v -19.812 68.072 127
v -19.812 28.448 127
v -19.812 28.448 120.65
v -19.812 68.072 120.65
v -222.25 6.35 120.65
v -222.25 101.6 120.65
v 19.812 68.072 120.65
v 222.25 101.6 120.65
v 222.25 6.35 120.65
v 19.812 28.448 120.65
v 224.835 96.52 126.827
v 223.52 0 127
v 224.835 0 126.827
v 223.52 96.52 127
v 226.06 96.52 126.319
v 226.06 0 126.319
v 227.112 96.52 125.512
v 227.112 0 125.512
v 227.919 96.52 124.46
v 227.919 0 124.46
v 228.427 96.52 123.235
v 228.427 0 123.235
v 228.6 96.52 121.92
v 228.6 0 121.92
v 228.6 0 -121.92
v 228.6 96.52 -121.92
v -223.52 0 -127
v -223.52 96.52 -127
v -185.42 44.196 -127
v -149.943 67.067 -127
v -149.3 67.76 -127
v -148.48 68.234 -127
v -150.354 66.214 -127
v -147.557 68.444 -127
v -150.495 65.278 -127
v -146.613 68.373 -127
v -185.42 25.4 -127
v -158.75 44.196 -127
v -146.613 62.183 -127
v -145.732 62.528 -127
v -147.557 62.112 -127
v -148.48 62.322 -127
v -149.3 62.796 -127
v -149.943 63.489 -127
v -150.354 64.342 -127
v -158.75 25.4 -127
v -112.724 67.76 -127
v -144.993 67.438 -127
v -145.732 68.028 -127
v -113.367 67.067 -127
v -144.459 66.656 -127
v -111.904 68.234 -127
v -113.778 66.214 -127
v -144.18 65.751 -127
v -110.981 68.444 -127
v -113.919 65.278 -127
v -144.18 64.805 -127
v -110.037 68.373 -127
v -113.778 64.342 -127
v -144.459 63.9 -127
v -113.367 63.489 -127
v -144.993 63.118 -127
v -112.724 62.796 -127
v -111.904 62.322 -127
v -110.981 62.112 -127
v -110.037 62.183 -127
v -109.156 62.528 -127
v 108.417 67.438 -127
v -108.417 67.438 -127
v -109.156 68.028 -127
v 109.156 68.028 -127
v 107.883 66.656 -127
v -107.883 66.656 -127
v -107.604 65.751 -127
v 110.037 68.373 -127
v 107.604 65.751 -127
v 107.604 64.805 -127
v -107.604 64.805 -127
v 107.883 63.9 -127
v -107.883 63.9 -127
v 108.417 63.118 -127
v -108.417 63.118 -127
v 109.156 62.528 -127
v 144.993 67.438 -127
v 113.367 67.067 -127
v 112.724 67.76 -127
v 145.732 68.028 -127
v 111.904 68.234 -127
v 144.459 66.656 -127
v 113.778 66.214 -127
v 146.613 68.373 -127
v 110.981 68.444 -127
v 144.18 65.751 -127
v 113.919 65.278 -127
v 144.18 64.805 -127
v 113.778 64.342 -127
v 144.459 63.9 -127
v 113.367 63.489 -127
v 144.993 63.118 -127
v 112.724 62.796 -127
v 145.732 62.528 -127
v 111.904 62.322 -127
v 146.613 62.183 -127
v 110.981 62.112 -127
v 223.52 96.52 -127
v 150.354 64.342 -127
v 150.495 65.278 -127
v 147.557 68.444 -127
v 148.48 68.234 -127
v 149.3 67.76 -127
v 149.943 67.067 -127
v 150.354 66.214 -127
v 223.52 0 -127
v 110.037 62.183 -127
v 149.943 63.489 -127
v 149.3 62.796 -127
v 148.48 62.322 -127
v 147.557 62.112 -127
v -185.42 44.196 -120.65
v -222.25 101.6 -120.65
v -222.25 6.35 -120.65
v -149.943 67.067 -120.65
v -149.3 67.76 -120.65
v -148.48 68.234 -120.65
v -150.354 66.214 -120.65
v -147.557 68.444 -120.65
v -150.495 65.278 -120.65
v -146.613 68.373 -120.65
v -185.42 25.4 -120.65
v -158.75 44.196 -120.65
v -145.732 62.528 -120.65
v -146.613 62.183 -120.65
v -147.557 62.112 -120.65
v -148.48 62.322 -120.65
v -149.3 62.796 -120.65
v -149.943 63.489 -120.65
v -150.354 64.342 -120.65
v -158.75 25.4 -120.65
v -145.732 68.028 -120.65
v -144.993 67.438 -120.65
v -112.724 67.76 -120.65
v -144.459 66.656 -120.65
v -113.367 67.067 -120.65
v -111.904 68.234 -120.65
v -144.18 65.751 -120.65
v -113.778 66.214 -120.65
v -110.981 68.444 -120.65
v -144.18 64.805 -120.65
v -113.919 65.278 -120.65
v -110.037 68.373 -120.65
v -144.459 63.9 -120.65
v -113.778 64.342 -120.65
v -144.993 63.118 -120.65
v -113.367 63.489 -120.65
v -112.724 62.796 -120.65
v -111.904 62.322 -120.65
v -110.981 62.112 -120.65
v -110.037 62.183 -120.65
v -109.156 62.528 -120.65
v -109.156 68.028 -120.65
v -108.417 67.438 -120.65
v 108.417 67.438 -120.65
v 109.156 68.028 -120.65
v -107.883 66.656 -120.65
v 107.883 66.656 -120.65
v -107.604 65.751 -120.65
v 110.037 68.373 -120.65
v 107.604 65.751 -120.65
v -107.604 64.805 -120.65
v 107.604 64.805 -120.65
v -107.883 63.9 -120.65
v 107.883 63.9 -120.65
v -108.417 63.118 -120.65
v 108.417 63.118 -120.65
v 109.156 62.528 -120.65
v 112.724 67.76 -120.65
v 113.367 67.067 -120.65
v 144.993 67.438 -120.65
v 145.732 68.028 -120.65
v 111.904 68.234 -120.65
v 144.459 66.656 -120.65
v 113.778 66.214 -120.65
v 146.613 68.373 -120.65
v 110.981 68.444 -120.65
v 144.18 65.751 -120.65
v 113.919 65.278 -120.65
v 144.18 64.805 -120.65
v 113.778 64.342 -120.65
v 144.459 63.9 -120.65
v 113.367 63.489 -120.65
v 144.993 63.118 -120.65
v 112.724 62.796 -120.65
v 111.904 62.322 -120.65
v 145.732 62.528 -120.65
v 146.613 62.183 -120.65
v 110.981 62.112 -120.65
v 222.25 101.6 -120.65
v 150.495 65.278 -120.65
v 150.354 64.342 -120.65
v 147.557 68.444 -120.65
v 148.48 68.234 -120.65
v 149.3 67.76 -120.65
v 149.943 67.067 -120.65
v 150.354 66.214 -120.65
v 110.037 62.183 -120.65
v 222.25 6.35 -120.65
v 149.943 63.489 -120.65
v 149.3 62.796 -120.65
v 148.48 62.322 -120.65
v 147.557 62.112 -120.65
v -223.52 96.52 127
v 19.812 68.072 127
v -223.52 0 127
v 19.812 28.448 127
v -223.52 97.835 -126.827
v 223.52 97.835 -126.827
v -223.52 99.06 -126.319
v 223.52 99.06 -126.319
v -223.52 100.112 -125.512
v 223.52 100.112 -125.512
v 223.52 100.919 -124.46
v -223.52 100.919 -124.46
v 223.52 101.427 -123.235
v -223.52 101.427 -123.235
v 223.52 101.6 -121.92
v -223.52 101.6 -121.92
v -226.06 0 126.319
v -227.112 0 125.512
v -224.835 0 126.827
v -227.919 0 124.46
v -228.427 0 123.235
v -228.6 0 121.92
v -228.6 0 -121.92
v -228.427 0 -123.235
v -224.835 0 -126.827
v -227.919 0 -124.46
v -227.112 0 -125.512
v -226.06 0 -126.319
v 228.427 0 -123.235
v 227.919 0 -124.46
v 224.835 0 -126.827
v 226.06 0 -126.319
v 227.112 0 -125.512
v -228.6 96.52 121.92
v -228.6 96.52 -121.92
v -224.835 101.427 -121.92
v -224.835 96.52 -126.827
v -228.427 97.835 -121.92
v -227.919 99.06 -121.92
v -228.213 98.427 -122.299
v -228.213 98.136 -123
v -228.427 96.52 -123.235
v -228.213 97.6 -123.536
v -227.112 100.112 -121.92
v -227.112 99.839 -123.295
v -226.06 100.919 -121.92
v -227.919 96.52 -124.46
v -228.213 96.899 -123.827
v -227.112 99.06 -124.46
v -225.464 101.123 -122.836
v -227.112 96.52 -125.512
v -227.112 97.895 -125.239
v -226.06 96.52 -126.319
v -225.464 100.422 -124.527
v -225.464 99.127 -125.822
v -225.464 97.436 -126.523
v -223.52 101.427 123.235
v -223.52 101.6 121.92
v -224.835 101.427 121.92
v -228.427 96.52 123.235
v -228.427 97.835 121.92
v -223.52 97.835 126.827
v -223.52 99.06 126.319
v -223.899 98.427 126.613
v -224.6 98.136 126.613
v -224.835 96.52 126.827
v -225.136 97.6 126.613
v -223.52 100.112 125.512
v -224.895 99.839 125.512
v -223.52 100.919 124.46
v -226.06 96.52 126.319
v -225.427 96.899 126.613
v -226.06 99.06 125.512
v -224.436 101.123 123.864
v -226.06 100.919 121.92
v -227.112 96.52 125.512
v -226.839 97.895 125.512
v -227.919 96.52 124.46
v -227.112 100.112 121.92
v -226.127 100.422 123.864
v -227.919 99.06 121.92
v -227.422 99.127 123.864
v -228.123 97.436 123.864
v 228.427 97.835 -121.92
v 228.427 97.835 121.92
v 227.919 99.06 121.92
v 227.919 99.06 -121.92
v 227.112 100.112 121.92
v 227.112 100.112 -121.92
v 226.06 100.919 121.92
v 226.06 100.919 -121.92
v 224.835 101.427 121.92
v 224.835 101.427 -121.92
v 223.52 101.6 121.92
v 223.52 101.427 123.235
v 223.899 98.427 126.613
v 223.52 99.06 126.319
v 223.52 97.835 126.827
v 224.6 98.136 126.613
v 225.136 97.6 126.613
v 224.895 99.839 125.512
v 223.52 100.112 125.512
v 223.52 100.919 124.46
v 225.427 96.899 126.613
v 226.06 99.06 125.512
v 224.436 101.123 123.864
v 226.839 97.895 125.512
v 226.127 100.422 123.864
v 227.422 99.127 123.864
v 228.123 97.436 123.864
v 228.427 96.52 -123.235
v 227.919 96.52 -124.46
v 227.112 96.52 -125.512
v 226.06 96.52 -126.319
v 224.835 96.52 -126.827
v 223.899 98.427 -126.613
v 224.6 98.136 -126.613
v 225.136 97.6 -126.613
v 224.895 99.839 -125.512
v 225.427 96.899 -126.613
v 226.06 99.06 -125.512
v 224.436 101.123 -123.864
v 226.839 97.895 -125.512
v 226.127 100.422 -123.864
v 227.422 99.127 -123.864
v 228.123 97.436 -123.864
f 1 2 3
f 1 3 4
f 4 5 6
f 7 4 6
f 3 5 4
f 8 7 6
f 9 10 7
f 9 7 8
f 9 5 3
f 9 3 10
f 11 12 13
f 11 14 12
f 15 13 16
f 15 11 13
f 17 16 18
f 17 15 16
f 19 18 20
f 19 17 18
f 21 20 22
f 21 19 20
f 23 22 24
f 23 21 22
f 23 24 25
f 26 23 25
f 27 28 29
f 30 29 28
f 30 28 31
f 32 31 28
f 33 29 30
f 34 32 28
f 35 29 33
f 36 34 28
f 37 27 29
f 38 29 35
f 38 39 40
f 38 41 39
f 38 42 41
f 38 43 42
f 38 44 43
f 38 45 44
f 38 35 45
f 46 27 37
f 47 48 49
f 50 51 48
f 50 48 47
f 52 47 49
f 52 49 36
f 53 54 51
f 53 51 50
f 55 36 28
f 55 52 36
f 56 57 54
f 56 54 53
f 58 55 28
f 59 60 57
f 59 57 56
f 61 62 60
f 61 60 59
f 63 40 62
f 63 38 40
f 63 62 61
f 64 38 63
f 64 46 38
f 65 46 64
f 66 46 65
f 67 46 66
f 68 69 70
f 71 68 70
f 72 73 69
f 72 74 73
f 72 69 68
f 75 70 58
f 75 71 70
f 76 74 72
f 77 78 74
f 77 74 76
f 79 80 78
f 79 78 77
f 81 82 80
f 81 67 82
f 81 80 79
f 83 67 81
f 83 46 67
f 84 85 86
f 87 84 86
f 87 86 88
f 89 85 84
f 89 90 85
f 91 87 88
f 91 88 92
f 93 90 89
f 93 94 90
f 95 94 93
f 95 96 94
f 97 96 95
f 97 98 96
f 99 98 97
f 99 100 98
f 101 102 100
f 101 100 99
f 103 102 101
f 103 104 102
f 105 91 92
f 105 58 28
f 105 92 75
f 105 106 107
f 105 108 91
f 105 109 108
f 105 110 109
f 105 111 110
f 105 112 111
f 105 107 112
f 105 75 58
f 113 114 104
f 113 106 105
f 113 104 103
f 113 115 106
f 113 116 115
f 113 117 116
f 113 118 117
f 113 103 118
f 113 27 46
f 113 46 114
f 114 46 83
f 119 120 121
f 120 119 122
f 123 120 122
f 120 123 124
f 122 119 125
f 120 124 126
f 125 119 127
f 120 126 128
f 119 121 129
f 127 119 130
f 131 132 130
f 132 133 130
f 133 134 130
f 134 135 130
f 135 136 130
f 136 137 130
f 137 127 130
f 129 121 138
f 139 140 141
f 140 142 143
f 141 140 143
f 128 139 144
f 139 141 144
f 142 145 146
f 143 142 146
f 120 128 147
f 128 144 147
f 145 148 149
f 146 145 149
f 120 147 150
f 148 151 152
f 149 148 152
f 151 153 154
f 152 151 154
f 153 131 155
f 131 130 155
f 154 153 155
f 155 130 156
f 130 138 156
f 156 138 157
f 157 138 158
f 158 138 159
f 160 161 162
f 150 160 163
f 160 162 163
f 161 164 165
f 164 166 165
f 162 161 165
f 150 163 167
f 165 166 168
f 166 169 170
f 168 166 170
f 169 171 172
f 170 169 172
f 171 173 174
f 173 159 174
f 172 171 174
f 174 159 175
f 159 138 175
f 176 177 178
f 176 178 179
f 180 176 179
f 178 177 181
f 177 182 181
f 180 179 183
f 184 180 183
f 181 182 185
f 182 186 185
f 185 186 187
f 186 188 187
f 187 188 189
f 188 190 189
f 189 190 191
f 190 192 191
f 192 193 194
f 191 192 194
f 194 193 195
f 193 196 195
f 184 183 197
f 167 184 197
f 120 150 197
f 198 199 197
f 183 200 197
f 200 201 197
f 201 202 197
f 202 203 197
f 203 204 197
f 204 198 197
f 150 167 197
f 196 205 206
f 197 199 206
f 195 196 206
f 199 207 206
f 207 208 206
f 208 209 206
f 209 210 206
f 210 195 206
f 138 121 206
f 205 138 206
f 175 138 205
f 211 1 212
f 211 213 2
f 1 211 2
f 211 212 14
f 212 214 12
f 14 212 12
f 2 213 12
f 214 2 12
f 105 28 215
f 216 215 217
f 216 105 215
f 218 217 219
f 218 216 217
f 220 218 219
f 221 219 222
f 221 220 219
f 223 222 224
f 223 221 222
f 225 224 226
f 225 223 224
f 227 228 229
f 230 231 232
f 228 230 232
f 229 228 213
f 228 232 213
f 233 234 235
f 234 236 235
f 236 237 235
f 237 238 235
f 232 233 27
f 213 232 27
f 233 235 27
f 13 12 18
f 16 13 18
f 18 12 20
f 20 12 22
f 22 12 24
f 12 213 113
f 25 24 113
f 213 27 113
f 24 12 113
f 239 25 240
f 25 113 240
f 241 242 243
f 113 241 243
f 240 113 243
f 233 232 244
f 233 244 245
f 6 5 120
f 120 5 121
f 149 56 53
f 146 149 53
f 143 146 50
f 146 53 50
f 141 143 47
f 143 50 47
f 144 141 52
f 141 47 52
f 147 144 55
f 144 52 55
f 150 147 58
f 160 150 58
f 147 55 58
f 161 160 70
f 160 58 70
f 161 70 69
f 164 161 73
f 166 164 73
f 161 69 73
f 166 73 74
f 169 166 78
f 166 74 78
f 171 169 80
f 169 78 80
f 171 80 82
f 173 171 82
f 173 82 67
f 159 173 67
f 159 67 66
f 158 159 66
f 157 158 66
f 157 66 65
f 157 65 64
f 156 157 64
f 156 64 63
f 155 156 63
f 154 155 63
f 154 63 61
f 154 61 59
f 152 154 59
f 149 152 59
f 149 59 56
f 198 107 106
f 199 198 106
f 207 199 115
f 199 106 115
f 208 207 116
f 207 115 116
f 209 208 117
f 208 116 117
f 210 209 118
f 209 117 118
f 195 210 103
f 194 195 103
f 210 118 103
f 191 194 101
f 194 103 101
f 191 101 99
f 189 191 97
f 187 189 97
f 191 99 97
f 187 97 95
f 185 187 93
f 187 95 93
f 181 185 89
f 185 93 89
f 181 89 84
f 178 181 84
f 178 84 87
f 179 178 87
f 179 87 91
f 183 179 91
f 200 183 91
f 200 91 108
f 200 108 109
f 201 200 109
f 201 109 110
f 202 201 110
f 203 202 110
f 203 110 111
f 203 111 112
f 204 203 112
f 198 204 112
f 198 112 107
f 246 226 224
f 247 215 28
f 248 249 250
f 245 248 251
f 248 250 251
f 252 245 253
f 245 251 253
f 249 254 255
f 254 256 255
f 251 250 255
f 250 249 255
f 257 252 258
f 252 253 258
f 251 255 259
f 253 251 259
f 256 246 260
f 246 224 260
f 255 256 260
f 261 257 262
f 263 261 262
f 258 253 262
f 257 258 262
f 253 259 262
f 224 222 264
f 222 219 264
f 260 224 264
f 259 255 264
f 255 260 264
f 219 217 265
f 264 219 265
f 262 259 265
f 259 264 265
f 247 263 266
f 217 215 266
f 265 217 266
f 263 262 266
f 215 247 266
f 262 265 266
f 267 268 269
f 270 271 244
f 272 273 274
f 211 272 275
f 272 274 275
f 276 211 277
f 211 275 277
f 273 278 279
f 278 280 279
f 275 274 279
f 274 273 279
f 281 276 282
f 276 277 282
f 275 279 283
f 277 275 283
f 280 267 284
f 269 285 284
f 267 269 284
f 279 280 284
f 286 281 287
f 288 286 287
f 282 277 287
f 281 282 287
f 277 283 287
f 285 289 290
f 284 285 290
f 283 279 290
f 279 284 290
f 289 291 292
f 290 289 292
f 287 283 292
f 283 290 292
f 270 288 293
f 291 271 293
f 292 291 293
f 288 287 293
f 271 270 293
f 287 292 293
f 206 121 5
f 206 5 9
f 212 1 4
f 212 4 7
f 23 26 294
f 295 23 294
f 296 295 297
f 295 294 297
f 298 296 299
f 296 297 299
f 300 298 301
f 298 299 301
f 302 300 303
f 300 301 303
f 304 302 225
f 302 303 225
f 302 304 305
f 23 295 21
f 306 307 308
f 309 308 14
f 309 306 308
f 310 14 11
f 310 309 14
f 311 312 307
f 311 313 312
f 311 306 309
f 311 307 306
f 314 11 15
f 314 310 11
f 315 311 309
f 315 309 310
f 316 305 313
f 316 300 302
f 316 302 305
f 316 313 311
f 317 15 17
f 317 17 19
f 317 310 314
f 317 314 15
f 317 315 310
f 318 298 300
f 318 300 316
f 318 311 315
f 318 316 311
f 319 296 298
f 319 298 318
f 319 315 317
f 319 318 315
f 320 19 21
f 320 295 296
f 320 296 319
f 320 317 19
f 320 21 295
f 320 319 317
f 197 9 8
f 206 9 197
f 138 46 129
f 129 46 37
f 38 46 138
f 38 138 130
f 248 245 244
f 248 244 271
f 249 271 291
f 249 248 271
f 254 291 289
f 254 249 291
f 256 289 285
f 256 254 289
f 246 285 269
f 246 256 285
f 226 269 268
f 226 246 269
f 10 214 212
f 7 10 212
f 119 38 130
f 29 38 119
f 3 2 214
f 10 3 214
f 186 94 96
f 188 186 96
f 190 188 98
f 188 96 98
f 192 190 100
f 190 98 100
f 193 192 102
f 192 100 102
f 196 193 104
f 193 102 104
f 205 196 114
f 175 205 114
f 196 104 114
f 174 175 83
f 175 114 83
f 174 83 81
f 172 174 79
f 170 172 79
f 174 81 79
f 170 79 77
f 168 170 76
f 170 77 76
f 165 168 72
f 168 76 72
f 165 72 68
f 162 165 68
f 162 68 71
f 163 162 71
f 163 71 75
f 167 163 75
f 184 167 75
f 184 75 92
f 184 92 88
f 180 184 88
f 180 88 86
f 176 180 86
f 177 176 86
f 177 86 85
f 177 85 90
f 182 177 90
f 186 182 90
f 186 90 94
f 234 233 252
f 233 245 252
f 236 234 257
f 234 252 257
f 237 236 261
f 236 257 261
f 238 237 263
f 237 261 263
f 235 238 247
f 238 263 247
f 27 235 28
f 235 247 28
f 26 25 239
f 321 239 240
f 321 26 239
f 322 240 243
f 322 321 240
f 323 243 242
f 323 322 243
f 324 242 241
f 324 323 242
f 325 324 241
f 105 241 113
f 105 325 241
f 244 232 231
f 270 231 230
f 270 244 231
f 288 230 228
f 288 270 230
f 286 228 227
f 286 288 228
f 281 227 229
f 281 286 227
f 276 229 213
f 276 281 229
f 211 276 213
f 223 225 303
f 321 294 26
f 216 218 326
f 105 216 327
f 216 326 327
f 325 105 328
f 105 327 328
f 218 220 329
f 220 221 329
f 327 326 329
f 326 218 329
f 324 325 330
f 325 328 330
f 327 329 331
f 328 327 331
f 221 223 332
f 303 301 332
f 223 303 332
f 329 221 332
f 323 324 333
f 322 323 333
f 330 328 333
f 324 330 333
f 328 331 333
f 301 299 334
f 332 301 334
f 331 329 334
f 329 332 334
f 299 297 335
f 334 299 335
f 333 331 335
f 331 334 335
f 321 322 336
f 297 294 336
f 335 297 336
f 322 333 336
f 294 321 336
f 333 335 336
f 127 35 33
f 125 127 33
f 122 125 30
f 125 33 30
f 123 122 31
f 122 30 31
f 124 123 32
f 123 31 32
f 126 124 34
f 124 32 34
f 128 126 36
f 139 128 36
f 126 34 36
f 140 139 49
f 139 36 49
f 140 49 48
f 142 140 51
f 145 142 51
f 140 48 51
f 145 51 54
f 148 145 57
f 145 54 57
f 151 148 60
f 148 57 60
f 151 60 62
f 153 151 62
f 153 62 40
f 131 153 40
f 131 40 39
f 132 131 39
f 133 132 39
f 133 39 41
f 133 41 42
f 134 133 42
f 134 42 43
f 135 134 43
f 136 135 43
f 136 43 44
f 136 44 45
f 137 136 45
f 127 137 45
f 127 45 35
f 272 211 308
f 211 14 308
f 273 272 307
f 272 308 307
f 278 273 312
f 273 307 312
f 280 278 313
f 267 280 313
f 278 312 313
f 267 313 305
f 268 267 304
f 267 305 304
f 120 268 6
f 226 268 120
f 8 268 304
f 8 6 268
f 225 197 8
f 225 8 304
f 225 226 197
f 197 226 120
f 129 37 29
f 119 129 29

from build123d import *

# Parameters (mm, degrees)
SKETCH1_W           = 457.2
SKETCH1_H           = 254
BOSS_EXTRUDE1_DEPTH = 101.6
SHELL1_T            = -6.35
FILLET1_R           = 5.08
CUT_EXTRUDE1_REACH  = 358.506
SKETCH3_W           = 39.624
SKETCH3_H           = 39.624
CUT_EXTRUDE3_REACH  = 358.506
SKETCH6_R           = 3.175
CUT_EXTRUDE4_REACH  = 358.506
SKETCH7_W           = 26.67
SKETCH7_H           = 18.796


with BuildPart() as part:
    # Sketch1 → Boss-Extrude1 (new body)
    with BuildSketch(Plane(origin=(0, 0, 0), x_dir=(1, 0, 0), z_dir=(0, 1, 0))):
        Rectangle(SKETCH1_W, SKETCH1_H)
    extrude(amount=BOSS_EXTRUDE1_DEPTH)

    # Shell1
    shell1_openings = [part.faces().sort_by_distance(p)[0] for p in [
        (0, 101.6, 0),
    ]]
    offset(amount=SHELL1_T, openings=shell1_openings, kind=Kind.INTERSECTION)

    # Fillet1
    fillet1_edges = [part.edges().sort_by_distance(p)[0] for p in [
        (228.6, 101.6, 0),
        (0, 101.6, -127),
        (-228.6, 101.6, 0),
        (0, 101.6, 127),
        (-228.6, 50.8, -127),
        (228.6, 50.8, -127),
        (228.6, 50.8, 127),
        (-228.6, 50.8, 127),
    ]]
    fillet(fillet1_edges, radius=FILLET1_R)

    # Sketch3 → Cut-Extrude1 (cut, up to next)
    with BuildSketch(Plane.XY.offset(127), mode=Mode.PRIVATE) as cut_extrude1_sk1:
        with Locations((0, 48.26)):
            Rectangle(SKETCH3_W, SKETCH3_H)
    cut_extrude1_tool1 = extrude(cut_extrude1_sk1.sketch, amount=-CUT_EXTRUDE1_REACH, mode=Mode.PRIVATE) & part.part
    add(cut_extrude1_tool1.solids().sort_by_distance((0, 48.26, 127))[0], mode=Mode.SUBTRACT)

    # Sketch6 → Cut-Extrude3 (cut, up to next)
    with BuildSketch(Plane(origin=(0, 0, -127), x_dir=(-1, 0, 0), z_dir=(0, 0, -1)), mode=Mode.PRIVATE) as cut_extrude3_sk1:
        with Locations((147.32, 65.278)):
            Circle(SKETCH6_R)
    cut_extrude3_tool1 = extrude(cut_extrude3_sk1.sketch, amount=-CUT_EXTRUDE3_REACH, mode=Mode.PRIVATE) & part.part
    # Sketch6 → Cut-Extrude3 (cut, up to next)
    with BuildSketch(Plane(origin=(0, 0, -127), x_dir=(-1, 0, 0), z_dir=(0, 0, -1)), mode=Mode.PRIVATE) as cut_extrude3_sk2:
        with Locations((110.744, 65.278)):
            Circle(SKETCH6_R)
    cut_extrude3_tool2 = extrude(cut_extrude3_sk2.sketch, amount=-CUT_EXTRUDE3_REACH, mode=Mode.PRIVATE) & part.part
    # Sketch6 → Cut-Extrude3 (cut, up to next)
    with BuildSketch(Plane(origin=(0, 0, -127), x_dir=(-1, 0, 0), z_dir=(0, 0, -1)), mode=Mode.PRIVATE) as cut_extrude3_sk3:
        with Locations(Location((-147.32, 65.278, 0), (0, 0, 180))):
            Circle(SKETCH6_R)
    cut_extrude3_tool3 = extrude(cut_extrude3_sk3.sketch, amount=-CUT_EXTRUDE3_REACH, mode=Mode.PRIVATE) & part.part
    # Sketch6 → Cut-Extrude3 (cut, up to next)
    with BuildSketch(Plane(origin=(0, 0, -127), x_dir=(-1, 0, 0), z_dir=(0, 0, -1)), mode=Mode.PRIVATE) as cut_extrude3_sk4:
        with Locations(Location((-110.744, 65.278, 0), (0, 0, 180))):
            Circle(SKETCH6_R)
    cut_extrude3_tool4 = extrude(cut_extrude3_sk4.sketch, amount=-CUT_EXTRUDE3_REACH, mode=Mode.PRIVATE) & part.part
    add(cut_extrude3_tool1.solids().sort_by_distance((-147.32, 65.278, -127))[0], mode=Mode.SUBTRACT)
    add(cut_extrude3_tool2.solids().sort_by_distance((-110.744, 65.278, -127))[0], mode=Mode.SUBTRACT)
    add(cut_extrude3_tool3.solids().sort_by_distance((147.32, 65.278, -127))[0], mode=Mode.SUBTRACT)
    add(cut_extrude3_tool4.solids().sort_by_distance((110.744, 65.278, -127))[0], mode=Mode.SUBTRACT)

    # Sketch7 → Cut-Extrude4 (cut, up to next)
    with BuildSketch(Plane(origin=(0, 0, -127), x_dir=(-1, 0, 0), z_dir=(0, 0, -1)), mode=Mode.PRIVATE) as cut_extrude4_sk1:
        with Locations((172.085, 34.798)):
            Rectangle(SKETCH7_W, SKETCH7_H)
    cut_extrude4_tool1 = extrude(cut_extrude4_sk1.sketch, amount=-CUT_EXTRUDE4_REACH, mode=Mode.PRIVATE) & part.part
    add(cut_extrude4_tool1.solids().sort_by_distance((-172.085, 34.798, -127))[0], mode=Mode.SUBTRACT)


solid = part.part
